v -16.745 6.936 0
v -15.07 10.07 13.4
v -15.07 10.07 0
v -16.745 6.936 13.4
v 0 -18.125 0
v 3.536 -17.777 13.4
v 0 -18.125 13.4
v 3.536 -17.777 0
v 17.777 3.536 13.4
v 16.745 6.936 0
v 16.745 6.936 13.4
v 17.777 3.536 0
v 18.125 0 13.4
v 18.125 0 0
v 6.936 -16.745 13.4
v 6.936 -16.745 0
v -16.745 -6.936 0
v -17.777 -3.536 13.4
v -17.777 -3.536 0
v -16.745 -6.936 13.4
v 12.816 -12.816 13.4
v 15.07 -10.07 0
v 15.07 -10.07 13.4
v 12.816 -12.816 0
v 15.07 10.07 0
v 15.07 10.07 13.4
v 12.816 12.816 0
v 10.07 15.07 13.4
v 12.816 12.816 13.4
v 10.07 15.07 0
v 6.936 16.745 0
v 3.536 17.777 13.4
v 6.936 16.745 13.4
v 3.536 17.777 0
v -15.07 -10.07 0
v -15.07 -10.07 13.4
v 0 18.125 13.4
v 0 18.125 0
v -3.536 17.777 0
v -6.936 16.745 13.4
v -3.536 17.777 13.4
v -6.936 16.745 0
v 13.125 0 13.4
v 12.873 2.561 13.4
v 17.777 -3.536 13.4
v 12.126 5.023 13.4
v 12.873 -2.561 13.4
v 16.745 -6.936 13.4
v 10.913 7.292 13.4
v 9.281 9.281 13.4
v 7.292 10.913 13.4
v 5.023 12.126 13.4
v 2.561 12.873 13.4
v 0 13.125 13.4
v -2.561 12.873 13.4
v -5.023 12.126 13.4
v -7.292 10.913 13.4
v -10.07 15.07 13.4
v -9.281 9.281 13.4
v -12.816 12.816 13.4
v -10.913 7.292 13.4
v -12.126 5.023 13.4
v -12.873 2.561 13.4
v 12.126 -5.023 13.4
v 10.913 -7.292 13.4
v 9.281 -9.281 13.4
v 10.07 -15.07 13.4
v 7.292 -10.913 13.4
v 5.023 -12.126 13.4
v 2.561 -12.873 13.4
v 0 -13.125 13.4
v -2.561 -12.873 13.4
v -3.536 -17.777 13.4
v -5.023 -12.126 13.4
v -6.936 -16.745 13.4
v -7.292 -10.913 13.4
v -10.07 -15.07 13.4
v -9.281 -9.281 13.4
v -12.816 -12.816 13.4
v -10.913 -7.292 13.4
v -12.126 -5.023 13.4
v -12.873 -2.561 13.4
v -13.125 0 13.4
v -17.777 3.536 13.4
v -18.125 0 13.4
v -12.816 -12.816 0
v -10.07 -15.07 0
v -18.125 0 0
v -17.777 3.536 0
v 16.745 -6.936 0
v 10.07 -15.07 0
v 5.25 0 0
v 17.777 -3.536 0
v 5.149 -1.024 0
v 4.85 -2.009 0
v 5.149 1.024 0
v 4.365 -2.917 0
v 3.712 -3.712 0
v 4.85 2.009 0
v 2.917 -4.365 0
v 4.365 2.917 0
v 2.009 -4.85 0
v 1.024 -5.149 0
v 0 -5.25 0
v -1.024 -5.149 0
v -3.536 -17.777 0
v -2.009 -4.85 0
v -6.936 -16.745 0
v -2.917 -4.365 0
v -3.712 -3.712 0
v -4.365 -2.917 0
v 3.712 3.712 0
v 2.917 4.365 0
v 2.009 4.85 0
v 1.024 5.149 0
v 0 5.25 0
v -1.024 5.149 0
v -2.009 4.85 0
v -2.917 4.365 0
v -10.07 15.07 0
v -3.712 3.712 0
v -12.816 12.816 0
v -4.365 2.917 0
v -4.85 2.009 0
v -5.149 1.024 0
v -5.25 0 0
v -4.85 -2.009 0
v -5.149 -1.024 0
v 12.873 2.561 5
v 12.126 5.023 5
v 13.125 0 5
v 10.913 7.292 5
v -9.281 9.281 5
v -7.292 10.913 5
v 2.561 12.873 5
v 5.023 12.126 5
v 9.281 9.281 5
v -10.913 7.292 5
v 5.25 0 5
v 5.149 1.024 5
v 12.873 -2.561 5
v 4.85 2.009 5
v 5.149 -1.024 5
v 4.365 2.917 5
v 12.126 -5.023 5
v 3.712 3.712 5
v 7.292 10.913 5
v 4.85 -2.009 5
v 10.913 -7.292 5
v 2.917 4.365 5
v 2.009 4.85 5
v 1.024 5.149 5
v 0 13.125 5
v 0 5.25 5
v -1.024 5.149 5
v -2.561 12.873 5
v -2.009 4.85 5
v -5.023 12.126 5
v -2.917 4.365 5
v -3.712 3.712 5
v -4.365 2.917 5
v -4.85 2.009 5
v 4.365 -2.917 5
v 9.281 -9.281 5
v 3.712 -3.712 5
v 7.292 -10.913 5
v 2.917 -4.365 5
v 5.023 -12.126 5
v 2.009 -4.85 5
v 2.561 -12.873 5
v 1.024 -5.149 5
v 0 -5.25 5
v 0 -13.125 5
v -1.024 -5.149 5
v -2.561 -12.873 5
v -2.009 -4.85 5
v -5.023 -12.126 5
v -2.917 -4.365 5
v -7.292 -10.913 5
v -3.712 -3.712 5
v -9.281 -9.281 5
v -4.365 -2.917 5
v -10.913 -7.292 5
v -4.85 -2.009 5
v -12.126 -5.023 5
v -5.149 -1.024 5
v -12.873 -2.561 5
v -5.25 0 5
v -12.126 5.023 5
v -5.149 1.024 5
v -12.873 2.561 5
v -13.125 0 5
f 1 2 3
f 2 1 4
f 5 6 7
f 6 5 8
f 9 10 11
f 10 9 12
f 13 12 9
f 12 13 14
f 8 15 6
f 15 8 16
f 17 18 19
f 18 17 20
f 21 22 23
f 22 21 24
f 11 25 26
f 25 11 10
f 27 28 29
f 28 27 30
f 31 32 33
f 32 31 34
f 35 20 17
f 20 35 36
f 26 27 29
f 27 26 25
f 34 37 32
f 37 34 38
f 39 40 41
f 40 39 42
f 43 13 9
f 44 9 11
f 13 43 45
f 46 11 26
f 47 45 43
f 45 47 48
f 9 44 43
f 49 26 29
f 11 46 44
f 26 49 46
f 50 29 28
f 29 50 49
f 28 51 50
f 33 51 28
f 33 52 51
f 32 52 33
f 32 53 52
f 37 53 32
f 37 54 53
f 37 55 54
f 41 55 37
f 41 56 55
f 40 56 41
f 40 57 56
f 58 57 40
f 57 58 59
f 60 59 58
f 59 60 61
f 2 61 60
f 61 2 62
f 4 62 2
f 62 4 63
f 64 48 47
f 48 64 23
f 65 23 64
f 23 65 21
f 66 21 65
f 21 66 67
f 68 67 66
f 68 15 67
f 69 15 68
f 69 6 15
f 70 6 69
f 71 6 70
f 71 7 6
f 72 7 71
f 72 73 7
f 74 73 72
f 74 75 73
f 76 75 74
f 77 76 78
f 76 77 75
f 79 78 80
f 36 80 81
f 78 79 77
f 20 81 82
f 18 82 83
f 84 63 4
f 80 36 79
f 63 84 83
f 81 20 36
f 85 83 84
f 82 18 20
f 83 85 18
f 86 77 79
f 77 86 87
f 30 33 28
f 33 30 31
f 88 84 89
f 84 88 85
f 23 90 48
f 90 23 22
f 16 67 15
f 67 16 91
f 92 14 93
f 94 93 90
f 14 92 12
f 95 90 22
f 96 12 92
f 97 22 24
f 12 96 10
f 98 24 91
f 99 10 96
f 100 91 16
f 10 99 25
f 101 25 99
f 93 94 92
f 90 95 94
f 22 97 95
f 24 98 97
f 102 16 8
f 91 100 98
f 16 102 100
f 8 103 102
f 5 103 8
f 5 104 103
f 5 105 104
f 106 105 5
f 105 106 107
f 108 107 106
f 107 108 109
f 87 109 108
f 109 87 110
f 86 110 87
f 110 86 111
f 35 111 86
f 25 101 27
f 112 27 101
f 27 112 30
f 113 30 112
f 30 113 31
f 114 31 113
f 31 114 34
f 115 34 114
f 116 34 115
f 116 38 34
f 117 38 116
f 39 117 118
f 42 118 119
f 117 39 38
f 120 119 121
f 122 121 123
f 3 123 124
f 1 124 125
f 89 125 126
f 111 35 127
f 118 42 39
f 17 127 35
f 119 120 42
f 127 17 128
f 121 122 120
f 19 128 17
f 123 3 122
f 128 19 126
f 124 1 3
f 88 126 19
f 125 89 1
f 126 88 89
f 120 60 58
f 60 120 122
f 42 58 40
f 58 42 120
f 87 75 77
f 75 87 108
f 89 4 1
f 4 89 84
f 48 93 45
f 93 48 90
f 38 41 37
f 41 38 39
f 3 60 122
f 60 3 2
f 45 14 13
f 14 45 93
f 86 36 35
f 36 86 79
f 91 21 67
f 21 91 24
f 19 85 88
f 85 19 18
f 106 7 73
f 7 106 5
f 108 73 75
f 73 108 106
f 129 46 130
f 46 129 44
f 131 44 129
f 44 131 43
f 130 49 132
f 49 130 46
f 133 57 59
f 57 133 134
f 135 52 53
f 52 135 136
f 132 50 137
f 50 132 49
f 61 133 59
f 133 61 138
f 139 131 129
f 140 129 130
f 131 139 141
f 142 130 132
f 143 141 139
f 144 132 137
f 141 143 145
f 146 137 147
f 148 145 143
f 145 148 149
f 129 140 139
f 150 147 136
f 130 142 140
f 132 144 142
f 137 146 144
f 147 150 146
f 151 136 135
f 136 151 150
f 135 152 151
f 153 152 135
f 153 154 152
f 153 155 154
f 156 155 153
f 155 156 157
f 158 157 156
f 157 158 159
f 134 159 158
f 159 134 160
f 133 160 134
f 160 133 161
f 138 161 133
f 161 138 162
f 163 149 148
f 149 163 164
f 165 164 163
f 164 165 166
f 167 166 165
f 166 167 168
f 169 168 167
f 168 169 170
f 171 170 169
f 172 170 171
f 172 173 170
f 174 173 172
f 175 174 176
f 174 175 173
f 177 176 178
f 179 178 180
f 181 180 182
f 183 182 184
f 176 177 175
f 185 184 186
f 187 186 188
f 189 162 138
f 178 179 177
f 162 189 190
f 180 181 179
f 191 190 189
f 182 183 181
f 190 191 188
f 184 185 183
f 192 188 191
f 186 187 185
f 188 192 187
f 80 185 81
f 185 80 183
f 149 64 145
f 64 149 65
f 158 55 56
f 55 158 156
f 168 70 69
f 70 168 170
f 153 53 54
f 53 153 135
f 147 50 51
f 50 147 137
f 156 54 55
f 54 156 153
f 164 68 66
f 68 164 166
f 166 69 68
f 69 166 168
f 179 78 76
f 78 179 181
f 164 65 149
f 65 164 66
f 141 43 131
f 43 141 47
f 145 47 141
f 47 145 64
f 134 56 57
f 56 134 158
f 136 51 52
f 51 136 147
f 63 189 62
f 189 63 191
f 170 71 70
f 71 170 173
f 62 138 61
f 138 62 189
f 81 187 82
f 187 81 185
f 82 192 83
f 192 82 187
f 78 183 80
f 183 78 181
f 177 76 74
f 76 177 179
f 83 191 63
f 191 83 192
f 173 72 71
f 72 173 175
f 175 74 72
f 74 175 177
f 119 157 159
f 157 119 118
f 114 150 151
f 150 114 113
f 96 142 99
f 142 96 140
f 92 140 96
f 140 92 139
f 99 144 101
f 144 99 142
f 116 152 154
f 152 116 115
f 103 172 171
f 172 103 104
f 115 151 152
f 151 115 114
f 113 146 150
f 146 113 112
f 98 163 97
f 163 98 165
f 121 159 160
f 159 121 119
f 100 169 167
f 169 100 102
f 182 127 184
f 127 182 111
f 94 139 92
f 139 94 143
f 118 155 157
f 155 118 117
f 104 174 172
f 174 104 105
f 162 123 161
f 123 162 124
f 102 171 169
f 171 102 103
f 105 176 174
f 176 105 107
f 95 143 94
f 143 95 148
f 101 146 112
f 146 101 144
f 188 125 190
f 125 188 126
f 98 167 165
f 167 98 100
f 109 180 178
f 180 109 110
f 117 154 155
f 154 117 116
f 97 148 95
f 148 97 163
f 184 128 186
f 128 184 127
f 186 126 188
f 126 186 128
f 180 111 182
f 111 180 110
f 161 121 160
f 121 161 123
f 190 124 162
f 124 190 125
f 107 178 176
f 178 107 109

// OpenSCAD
$fn = 32;

// ----------------------------------------------------------------------
// Bearing housing: seat for 6000 (26 x 8 mm), 36.25 mm body
// ----------------------------------------------------------------------

// --- parameters (mm) ---
body_od = 36.25;          // housing outside diameter
body_h = 13.4;            // overall housing height
wall = 5;                 // wall thickness
pocket_d = 26.25;         // 6000 seat, 0.25 mm clearance
seat_h = 8.4;             // pocket depth
shoulder = 5;             // shoulder under the bearing
pass_d = 10.5;            // shaft passage

module body() {
  cylinder(h = body_h, d = body_od);
}

difference() {
  union() {
    body();
  }
  translate([0, 0, body_h - seat_h]) cylinder(h = seat_h + 1, d = pocket_d);
  translate([0, 0, -1]) cylinder(h = body_h - seat_h + 1, d = pass_d);
}
